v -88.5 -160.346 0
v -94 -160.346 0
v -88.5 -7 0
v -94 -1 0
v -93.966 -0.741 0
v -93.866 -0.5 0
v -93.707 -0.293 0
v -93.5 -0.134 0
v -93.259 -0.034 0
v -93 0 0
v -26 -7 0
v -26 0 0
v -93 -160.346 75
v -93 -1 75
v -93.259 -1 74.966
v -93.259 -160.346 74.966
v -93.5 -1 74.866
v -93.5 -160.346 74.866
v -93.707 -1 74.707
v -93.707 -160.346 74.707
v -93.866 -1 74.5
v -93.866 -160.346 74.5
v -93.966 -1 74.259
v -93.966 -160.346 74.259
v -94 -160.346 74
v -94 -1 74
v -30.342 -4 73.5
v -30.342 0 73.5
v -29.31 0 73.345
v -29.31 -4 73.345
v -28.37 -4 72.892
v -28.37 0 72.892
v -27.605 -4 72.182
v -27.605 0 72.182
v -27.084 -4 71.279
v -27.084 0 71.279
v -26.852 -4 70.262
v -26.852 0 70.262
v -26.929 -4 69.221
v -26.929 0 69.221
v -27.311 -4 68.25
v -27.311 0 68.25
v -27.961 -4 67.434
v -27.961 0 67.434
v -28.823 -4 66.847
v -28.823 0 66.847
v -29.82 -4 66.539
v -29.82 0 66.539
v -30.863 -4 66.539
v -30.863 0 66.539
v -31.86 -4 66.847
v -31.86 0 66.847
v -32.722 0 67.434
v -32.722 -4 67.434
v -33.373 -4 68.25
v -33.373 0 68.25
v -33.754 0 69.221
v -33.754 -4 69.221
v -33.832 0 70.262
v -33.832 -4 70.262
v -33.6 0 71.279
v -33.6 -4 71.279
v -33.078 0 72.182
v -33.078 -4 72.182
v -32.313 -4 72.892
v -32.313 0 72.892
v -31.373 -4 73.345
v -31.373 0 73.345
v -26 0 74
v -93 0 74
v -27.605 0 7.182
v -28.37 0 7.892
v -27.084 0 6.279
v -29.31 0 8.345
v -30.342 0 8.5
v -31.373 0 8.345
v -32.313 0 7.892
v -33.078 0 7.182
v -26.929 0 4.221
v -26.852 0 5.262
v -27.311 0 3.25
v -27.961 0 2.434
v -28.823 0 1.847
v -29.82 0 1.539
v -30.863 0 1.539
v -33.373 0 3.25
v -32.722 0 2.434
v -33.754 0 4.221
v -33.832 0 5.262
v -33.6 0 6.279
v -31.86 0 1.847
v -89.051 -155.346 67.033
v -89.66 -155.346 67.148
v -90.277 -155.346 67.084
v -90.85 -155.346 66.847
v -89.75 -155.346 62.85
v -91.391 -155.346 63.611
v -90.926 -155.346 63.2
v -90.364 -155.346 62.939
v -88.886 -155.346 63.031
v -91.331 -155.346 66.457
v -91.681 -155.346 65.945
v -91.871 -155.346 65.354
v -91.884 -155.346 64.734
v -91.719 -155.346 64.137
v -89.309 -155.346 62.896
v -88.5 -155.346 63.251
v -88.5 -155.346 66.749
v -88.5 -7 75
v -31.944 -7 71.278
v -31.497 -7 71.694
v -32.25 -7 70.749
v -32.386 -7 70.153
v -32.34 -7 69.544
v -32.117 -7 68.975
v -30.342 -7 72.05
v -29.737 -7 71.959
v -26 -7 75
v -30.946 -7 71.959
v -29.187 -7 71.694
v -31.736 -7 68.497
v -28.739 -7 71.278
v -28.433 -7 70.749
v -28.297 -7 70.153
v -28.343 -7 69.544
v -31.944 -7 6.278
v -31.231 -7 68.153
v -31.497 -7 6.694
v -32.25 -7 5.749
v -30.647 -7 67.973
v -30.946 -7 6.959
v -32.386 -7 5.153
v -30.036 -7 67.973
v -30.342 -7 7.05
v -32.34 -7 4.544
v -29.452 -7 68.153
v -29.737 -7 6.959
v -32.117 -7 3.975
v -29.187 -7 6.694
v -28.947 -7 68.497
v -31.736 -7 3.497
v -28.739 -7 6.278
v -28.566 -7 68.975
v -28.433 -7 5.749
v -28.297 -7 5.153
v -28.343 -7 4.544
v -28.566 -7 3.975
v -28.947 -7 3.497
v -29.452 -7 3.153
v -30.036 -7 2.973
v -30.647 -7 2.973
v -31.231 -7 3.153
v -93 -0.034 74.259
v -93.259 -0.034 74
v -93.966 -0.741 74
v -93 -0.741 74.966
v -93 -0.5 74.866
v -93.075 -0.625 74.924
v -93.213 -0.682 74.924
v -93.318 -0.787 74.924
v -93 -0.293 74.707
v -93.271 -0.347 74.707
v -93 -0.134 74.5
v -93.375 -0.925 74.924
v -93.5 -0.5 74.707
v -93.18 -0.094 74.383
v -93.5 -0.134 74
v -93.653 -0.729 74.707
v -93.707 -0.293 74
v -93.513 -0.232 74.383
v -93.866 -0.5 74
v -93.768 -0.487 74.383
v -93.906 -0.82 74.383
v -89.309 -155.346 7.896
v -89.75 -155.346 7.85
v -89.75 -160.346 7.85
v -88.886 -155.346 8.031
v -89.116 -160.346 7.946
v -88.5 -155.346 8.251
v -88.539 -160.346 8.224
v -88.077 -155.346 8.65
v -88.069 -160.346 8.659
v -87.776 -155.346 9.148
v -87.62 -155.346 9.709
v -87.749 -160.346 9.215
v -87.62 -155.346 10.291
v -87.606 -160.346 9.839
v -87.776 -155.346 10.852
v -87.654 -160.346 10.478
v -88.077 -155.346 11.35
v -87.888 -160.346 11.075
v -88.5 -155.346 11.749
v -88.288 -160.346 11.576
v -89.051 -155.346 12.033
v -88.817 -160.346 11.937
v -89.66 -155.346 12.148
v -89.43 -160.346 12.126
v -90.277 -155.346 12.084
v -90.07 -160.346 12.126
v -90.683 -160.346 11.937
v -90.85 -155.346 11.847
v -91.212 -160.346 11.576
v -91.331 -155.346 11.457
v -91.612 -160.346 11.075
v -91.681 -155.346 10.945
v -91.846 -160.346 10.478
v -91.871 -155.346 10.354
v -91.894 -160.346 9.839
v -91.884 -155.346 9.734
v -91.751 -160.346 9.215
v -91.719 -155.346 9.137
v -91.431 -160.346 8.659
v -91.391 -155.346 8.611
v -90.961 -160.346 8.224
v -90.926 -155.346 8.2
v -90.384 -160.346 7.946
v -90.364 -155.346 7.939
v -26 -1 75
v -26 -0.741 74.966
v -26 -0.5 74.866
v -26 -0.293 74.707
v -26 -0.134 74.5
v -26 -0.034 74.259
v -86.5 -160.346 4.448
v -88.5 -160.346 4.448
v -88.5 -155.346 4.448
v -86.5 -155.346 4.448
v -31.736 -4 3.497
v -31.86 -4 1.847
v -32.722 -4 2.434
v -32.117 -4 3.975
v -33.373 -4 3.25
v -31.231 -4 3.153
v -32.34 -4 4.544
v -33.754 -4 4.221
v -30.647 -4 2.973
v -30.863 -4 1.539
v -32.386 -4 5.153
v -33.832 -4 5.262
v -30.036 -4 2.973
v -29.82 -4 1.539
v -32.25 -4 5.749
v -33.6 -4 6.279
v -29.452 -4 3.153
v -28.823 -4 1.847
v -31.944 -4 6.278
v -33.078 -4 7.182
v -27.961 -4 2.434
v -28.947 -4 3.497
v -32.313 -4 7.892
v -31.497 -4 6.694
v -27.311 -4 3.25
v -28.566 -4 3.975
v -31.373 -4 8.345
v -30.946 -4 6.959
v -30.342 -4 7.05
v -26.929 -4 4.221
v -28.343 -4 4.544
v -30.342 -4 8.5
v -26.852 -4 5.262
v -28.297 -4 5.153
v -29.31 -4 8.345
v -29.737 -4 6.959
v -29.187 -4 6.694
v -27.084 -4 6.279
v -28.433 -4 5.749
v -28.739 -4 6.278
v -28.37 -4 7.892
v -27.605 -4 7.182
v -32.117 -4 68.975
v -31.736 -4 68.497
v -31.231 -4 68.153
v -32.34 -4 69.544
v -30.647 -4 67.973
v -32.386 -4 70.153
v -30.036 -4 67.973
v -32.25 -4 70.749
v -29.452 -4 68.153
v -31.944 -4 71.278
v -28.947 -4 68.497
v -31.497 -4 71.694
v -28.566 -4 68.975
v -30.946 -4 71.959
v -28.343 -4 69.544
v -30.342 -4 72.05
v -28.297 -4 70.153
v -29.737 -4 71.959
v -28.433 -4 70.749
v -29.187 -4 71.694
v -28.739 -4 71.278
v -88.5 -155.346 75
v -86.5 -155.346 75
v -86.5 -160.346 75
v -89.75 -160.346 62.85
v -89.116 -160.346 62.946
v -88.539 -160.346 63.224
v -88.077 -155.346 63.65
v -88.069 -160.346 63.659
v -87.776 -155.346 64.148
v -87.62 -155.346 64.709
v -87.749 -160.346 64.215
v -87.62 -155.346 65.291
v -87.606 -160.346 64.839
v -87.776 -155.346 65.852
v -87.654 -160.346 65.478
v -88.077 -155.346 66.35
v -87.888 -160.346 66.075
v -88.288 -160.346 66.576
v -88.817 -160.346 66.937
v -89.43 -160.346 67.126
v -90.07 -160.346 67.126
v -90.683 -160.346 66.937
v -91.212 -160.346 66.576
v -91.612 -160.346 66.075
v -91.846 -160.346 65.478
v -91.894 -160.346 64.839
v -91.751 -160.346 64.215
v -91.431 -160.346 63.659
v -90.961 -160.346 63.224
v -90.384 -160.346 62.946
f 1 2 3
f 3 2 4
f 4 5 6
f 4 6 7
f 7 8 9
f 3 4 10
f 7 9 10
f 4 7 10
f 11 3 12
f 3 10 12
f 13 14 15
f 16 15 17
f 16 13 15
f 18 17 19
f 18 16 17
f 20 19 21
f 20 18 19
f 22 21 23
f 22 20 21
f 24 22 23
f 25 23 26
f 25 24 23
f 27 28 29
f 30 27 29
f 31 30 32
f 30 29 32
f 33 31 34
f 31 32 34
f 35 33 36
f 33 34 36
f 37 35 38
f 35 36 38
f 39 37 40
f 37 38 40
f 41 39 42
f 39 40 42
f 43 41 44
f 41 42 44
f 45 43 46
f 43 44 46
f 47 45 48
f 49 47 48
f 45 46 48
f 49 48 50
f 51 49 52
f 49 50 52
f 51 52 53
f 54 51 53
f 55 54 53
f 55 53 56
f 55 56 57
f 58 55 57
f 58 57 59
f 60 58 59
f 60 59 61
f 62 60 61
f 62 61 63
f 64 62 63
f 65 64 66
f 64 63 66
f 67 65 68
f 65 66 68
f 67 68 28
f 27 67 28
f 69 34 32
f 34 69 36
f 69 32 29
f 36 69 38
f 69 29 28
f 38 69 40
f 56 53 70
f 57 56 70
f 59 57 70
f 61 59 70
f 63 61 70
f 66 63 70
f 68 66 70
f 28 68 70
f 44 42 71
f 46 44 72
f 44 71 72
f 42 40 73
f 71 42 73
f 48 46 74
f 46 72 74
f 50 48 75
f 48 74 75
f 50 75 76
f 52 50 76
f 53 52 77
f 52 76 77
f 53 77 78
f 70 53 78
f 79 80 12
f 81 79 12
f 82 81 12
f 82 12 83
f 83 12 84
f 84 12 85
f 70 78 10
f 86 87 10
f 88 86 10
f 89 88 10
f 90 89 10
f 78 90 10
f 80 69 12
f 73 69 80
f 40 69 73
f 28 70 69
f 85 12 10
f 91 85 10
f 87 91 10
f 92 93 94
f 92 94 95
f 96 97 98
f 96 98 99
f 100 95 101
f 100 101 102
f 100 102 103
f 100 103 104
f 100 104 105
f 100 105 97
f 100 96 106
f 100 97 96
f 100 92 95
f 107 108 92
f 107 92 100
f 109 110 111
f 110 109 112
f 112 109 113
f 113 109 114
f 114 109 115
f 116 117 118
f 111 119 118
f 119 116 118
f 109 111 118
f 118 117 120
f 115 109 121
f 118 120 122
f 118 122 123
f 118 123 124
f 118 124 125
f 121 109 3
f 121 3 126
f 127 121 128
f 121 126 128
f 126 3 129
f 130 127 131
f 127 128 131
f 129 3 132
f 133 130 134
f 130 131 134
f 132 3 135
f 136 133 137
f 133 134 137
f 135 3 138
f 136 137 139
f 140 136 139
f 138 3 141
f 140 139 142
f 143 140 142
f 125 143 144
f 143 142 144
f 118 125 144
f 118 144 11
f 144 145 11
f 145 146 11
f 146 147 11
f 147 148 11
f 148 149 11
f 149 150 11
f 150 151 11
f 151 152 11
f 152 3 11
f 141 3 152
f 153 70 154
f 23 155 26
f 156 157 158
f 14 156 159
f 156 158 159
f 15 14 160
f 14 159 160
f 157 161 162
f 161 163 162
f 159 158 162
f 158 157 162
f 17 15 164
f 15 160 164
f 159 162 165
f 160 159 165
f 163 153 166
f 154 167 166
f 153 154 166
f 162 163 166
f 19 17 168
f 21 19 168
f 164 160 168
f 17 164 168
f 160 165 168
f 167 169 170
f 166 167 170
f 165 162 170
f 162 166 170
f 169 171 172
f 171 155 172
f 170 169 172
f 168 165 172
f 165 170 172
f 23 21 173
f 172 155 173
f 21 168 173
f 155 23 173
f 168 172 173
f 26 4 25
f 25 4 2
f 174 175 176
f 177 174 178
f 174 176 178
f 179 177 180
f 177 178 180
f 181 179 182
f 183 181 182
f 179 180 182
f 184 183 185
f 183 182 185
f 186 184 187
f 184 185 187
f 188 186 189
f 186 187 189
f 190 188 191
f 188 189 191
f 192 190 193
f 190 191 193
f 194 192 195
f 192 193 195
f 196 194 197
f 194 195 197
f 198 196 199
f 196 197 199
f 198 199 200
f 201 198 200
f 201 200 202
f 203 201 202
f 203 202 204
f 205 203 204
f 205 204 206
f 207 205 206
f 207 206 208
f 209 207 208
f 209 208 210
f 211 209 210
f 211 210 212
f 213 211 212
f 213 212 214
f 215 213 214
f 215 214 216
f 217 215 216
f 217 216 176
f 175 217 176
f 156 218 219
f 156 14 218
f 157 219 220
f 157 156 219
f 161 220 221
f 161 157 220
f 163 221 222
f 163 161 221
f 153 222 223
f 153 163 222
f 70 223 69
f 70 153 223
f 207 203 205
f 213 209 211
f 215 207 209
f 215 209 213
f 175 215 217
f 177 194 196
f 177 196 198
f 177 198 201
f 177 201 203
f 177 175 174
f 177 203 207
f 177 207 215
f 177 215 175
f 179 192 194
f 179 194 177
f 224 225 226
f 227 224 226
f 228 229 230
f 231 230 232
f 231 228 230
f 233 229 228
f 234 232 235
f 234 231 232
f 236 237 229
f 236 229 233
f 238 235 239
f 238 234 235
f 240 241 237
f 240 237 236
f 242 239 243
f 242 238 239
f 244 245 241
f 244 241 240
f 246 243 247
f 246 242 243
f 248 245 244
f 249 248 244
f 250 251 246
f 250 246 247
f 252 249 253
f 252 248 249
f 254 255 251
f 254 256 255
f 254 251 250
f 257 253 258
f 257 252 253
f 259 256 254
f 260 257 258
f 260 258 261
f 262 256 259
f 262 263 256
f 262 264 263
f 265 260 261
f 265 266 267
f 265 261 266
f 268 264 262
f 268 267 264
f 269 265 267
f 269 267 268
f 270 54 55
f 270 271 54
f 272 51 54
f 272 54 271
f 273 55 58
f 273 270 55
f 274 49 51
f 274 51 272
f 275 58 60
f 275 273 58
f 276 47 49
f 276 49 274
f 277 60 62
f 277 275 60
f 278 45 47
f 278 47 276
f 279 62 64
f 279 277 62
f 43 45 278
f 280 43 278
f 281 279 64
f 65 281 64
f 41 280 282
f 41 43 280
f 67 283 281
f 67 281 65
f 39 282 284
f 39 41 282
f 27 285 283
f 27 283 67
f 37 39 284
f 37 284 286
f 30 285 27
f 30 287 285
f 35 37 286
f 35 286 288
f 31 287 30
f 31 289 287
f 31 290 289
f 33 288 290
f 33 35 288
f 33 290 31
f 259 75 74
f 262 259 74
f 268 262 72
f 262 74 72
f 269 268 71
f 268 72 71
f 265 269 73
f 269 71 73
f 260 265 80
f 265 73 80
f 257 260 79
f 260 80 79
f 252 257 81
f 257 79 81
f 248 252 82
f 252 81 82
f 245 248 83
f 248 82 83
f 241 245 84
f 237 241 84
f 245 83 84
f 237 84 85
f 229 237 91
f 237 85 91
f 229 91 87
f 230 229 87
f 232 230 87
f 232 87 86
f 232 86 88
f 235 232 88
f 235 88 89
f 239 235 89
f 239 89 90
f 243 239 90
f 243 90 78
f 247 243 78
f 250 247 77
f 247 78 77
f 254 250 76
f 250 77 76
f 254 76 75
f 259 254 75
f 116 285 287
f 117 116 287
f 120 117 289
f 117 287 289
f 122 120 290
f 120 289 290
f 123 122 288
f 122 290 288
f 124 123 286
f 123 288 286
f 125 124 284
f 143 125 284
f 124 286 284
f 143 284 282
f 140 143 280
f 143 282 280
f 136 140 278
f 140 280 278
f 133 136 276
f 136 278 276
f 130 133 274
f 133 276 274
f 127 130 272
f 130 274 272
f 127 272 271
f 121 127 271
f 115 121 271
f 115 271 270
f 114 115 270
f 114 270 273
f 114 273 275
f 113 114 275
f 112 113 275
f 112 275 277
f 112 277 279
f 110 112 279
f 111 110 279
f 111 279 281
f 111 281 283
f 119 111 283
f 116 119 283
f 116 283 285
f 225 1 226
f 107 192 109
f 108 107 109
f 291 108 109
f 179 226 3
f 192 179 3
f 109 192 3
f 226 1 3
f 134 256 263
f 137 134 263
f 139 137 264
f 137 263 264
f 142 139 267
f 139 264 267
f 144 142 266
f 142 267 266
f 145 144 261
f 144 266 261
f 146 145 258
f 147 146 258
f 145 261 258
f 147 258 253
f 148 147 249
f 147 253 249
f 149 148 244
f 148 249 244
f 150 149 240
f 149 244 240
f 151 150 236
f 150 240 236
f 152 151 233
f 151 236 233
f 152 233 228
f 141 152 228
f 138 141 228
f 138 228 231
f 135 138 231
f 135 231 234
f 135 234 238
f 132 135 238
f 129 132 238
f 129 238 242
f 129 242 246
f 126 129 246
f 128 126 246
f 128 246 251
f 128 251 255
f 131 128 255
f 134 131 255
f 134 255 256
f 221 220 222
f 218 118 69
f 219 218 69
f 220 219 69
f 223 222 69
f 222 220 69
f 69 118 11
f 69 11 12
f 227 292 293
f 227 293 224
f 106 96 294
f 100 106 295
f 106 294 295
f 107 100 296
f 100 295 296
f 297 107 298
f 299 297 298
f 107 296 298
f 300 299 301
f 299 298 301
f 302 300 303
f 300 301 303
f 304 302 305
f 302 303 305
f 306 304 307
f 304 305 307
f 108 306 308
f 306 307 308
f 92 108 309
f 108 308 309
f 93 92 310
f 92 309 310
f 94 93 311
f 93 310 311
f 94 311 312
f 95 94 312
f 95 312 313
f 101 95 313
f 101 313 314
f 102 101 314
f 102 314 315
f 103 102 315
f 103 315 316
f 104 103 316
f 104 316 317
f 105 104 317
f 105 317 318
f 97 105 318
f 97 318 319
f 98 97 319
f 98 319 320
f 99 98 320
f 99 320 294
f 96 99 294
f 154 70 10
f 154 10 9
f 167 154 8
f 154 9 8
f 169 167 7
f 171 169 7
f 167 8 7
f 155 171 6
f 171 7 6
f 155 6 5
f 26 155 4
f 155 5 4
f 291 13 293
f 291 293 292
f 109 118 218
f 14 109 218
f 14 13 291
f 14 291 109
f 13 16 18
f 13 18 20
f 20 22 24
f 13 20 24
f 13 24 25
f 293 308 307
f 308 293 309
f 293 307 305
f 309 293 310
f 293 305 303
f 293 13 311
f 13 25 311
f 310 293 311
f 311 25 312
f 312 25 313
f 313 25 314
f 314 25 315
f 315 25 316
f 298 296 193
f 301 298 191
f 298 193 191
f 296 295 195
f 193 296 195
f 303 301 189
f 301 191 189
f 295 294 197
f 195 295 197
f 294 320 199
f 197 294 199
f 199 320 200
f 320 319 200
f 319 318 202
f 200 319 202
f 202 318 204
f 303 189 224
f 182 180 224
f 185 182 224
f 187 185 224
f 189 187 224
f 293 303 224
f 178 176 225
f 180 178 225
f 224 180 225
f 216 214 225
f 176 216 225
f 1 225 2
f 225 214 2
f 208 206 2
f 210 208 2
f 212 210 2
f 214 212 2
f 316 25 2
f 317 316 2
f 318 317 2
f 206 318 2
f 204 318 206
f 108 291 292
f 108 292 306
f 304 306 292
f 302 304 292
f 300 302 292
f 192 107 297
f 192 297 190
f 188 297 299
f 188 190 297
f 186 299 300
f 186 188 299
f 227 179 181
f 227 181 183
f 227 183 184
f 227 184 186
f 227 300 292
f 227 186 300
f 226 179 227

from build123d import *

# Parameters (mm, degrees)
BOSS_EXTRUDE1_DEPTH = 75
CUT_EXTRUDE2_REACH  = 202.429
SKETCH4_R           = 2.05
SKETCH4_3_R         = 3.5
SKETCH4_3_R_2       = 2.05
CUT_EXTRUDE3_DEPTH  = 4
SKETCH5_W           = 70.551930768
SKETCH5_H           = 5
BOSS_EXTRUDE2_DEPTH = 2
SKETCH6_R           = 2.15
CUT_EXTRUDE4_DEPTH  = 5
FILLET1_R           = 1


with BuildPart() as part:
    # Sketch2 → Boss-Extrude1 (new body)
    with BuildSketch(Plane.XY):
        with BuildLine():
            Line((-88.5, -160.346147872), (-88.5, -7))
            Line((-88.5, -7), (-26, -7))
            Line((-26, -7), (-26, 0))
            Line((-26, 0), (-93, 0))
            ThreePointArc((-93, 0), (-93.707106781, -0.292893219), (-94, -1))
            Line((-94, -1), (-94, -160.346147872))
            Line((-94, -160.346147872), (-88.5, -160.346147872))
        make_face()
    extrude(amount=BOSS_EXTRUDE1_DEPTH)

    # Sketch4 → Cut-Extrude2 (cut, up to next)
    with BuildSketch(Plane(origin=(0, 0, 0), x_dir=(1, 0, 0), z_dir=(0, 1, 0)), mode=Mode.PRIVATE) as cut_extrude2_sk1:
        with Locations(Location((-30.341713377, -5, 0), (0, 0, 270))):
            Circle(SKETCH4_R)
    cut_extrude2_tool1 = extrude(cut_extrude2_sk1.sketch, amount=-CUT_EXTRUDE2_REACH, mode=Mode.PRIVATE) & part.part
    # Sketch4 → Cut-Extrude2 (cut, up to next)
    with BuildSketch(Plane(origin=(0, 0, 0), x_dir=(1, 0, 0), z_dir=(0, 1, 0)), mode=Mode.PRIVATE) as cut_extrude2_sk2:
        with Locations(Location((-30.341713377, -70, 0), (0, 0, 270))):
            Circle(SKETCH4_R)
    cut_extrude2_tool2 = extrude(cut_extrude2_sk2.sketch, amount=-CUT_EXTRUDE2_REACH, mode=Mode.PRIVATE) & part.part
    add(cut_extrude2_tool1.solids().sort_by_distance((-30.341713, 0, 5))[0], mode=Mode.SUBTRACT)
    add(cut_extrude2_tool2.solids().sort_by_distance((-30.341713, 0, 70))[0], mode=Mode.SUBTRACT)

    # Sketch4<3> → Cut-Extrude3 (cut)
    # profile 1 of 2: a face of its own
    with BuildSketch(Plane(origin=(0, 0, 0), x_dir=(1, 0, 0), z_dir=(0, 1, 0))):
        with Locations(Location((-30.341713377, -5, 0), (0, 0, 270))):
            Circle(SKETCH4_3_R)
        with Locations(Location((-30.341713377, -5, 0), (0, 0, 270))):
            Circle(SKETCH4_3_R_2, mode=Mode.SUBTRACT)
    # profile 2 of 2: a face of its own
    with BuildSketch(Plane(origin=(0, 0, 0), x_dir=(1, 0, 0), z_dir=(0, 1, 0))):
        with Locations(Location((-30.341713377, -70, 0), (0, 0, 270))):
            Circle(SKETCH4_3_R)
        with Locations(Location((-30.341713377, -70, 0), (0, 0, 270))):
            Circle(SKETCH4_3_R_2, mode=Mode.SUBTRACT)
    extrude(amount=-CUT_EXTRUDE3_DEPTH, mode=Mode.SUBTRACT)

    # Sketch5 → Boss-Extrude2 (add)
    with BuildSketch(Plane(origin=(-88.5, 0, 0), x_dir=(0, 0, -1), z_dir=(1, 0, 0))):
        with Locations((-39.724034616, -157.846147872)):
            Rectangle(SKETCH5_W, SKETCH5_H)
    extrude(amount=BOSS_EXTRUDE2_DEPTH)

    # Sketch6 → Cut-Extrude4 (cut)
    with BuildSketch(Plane.XZ.offset(160.346147872)):
        with Locations(Location((-89.75, 10, 0), (0, 0, 270))):
            Circle(SKETCH6_R)
        with Locations(Location((-89.75, 65, 0), (0, 0, 270))):
            Circle(SKETCH6_R)
    extrude(amount=-CUT_EXTRUDE4_DEPTH, mode=Mode.SUBTRACT)

    # Fillet1
    fillet1_edges = [part.edges().sort_by_distance(p)[0] for p in [
        (-94, -80.673073936, 75),
        (-93.707106781, -0.292893219, 75),
        (-59.5, 0, 75),
    ]]
    fillet(fillet1_edges, radius=FILLET1_R)


solid = part.part
